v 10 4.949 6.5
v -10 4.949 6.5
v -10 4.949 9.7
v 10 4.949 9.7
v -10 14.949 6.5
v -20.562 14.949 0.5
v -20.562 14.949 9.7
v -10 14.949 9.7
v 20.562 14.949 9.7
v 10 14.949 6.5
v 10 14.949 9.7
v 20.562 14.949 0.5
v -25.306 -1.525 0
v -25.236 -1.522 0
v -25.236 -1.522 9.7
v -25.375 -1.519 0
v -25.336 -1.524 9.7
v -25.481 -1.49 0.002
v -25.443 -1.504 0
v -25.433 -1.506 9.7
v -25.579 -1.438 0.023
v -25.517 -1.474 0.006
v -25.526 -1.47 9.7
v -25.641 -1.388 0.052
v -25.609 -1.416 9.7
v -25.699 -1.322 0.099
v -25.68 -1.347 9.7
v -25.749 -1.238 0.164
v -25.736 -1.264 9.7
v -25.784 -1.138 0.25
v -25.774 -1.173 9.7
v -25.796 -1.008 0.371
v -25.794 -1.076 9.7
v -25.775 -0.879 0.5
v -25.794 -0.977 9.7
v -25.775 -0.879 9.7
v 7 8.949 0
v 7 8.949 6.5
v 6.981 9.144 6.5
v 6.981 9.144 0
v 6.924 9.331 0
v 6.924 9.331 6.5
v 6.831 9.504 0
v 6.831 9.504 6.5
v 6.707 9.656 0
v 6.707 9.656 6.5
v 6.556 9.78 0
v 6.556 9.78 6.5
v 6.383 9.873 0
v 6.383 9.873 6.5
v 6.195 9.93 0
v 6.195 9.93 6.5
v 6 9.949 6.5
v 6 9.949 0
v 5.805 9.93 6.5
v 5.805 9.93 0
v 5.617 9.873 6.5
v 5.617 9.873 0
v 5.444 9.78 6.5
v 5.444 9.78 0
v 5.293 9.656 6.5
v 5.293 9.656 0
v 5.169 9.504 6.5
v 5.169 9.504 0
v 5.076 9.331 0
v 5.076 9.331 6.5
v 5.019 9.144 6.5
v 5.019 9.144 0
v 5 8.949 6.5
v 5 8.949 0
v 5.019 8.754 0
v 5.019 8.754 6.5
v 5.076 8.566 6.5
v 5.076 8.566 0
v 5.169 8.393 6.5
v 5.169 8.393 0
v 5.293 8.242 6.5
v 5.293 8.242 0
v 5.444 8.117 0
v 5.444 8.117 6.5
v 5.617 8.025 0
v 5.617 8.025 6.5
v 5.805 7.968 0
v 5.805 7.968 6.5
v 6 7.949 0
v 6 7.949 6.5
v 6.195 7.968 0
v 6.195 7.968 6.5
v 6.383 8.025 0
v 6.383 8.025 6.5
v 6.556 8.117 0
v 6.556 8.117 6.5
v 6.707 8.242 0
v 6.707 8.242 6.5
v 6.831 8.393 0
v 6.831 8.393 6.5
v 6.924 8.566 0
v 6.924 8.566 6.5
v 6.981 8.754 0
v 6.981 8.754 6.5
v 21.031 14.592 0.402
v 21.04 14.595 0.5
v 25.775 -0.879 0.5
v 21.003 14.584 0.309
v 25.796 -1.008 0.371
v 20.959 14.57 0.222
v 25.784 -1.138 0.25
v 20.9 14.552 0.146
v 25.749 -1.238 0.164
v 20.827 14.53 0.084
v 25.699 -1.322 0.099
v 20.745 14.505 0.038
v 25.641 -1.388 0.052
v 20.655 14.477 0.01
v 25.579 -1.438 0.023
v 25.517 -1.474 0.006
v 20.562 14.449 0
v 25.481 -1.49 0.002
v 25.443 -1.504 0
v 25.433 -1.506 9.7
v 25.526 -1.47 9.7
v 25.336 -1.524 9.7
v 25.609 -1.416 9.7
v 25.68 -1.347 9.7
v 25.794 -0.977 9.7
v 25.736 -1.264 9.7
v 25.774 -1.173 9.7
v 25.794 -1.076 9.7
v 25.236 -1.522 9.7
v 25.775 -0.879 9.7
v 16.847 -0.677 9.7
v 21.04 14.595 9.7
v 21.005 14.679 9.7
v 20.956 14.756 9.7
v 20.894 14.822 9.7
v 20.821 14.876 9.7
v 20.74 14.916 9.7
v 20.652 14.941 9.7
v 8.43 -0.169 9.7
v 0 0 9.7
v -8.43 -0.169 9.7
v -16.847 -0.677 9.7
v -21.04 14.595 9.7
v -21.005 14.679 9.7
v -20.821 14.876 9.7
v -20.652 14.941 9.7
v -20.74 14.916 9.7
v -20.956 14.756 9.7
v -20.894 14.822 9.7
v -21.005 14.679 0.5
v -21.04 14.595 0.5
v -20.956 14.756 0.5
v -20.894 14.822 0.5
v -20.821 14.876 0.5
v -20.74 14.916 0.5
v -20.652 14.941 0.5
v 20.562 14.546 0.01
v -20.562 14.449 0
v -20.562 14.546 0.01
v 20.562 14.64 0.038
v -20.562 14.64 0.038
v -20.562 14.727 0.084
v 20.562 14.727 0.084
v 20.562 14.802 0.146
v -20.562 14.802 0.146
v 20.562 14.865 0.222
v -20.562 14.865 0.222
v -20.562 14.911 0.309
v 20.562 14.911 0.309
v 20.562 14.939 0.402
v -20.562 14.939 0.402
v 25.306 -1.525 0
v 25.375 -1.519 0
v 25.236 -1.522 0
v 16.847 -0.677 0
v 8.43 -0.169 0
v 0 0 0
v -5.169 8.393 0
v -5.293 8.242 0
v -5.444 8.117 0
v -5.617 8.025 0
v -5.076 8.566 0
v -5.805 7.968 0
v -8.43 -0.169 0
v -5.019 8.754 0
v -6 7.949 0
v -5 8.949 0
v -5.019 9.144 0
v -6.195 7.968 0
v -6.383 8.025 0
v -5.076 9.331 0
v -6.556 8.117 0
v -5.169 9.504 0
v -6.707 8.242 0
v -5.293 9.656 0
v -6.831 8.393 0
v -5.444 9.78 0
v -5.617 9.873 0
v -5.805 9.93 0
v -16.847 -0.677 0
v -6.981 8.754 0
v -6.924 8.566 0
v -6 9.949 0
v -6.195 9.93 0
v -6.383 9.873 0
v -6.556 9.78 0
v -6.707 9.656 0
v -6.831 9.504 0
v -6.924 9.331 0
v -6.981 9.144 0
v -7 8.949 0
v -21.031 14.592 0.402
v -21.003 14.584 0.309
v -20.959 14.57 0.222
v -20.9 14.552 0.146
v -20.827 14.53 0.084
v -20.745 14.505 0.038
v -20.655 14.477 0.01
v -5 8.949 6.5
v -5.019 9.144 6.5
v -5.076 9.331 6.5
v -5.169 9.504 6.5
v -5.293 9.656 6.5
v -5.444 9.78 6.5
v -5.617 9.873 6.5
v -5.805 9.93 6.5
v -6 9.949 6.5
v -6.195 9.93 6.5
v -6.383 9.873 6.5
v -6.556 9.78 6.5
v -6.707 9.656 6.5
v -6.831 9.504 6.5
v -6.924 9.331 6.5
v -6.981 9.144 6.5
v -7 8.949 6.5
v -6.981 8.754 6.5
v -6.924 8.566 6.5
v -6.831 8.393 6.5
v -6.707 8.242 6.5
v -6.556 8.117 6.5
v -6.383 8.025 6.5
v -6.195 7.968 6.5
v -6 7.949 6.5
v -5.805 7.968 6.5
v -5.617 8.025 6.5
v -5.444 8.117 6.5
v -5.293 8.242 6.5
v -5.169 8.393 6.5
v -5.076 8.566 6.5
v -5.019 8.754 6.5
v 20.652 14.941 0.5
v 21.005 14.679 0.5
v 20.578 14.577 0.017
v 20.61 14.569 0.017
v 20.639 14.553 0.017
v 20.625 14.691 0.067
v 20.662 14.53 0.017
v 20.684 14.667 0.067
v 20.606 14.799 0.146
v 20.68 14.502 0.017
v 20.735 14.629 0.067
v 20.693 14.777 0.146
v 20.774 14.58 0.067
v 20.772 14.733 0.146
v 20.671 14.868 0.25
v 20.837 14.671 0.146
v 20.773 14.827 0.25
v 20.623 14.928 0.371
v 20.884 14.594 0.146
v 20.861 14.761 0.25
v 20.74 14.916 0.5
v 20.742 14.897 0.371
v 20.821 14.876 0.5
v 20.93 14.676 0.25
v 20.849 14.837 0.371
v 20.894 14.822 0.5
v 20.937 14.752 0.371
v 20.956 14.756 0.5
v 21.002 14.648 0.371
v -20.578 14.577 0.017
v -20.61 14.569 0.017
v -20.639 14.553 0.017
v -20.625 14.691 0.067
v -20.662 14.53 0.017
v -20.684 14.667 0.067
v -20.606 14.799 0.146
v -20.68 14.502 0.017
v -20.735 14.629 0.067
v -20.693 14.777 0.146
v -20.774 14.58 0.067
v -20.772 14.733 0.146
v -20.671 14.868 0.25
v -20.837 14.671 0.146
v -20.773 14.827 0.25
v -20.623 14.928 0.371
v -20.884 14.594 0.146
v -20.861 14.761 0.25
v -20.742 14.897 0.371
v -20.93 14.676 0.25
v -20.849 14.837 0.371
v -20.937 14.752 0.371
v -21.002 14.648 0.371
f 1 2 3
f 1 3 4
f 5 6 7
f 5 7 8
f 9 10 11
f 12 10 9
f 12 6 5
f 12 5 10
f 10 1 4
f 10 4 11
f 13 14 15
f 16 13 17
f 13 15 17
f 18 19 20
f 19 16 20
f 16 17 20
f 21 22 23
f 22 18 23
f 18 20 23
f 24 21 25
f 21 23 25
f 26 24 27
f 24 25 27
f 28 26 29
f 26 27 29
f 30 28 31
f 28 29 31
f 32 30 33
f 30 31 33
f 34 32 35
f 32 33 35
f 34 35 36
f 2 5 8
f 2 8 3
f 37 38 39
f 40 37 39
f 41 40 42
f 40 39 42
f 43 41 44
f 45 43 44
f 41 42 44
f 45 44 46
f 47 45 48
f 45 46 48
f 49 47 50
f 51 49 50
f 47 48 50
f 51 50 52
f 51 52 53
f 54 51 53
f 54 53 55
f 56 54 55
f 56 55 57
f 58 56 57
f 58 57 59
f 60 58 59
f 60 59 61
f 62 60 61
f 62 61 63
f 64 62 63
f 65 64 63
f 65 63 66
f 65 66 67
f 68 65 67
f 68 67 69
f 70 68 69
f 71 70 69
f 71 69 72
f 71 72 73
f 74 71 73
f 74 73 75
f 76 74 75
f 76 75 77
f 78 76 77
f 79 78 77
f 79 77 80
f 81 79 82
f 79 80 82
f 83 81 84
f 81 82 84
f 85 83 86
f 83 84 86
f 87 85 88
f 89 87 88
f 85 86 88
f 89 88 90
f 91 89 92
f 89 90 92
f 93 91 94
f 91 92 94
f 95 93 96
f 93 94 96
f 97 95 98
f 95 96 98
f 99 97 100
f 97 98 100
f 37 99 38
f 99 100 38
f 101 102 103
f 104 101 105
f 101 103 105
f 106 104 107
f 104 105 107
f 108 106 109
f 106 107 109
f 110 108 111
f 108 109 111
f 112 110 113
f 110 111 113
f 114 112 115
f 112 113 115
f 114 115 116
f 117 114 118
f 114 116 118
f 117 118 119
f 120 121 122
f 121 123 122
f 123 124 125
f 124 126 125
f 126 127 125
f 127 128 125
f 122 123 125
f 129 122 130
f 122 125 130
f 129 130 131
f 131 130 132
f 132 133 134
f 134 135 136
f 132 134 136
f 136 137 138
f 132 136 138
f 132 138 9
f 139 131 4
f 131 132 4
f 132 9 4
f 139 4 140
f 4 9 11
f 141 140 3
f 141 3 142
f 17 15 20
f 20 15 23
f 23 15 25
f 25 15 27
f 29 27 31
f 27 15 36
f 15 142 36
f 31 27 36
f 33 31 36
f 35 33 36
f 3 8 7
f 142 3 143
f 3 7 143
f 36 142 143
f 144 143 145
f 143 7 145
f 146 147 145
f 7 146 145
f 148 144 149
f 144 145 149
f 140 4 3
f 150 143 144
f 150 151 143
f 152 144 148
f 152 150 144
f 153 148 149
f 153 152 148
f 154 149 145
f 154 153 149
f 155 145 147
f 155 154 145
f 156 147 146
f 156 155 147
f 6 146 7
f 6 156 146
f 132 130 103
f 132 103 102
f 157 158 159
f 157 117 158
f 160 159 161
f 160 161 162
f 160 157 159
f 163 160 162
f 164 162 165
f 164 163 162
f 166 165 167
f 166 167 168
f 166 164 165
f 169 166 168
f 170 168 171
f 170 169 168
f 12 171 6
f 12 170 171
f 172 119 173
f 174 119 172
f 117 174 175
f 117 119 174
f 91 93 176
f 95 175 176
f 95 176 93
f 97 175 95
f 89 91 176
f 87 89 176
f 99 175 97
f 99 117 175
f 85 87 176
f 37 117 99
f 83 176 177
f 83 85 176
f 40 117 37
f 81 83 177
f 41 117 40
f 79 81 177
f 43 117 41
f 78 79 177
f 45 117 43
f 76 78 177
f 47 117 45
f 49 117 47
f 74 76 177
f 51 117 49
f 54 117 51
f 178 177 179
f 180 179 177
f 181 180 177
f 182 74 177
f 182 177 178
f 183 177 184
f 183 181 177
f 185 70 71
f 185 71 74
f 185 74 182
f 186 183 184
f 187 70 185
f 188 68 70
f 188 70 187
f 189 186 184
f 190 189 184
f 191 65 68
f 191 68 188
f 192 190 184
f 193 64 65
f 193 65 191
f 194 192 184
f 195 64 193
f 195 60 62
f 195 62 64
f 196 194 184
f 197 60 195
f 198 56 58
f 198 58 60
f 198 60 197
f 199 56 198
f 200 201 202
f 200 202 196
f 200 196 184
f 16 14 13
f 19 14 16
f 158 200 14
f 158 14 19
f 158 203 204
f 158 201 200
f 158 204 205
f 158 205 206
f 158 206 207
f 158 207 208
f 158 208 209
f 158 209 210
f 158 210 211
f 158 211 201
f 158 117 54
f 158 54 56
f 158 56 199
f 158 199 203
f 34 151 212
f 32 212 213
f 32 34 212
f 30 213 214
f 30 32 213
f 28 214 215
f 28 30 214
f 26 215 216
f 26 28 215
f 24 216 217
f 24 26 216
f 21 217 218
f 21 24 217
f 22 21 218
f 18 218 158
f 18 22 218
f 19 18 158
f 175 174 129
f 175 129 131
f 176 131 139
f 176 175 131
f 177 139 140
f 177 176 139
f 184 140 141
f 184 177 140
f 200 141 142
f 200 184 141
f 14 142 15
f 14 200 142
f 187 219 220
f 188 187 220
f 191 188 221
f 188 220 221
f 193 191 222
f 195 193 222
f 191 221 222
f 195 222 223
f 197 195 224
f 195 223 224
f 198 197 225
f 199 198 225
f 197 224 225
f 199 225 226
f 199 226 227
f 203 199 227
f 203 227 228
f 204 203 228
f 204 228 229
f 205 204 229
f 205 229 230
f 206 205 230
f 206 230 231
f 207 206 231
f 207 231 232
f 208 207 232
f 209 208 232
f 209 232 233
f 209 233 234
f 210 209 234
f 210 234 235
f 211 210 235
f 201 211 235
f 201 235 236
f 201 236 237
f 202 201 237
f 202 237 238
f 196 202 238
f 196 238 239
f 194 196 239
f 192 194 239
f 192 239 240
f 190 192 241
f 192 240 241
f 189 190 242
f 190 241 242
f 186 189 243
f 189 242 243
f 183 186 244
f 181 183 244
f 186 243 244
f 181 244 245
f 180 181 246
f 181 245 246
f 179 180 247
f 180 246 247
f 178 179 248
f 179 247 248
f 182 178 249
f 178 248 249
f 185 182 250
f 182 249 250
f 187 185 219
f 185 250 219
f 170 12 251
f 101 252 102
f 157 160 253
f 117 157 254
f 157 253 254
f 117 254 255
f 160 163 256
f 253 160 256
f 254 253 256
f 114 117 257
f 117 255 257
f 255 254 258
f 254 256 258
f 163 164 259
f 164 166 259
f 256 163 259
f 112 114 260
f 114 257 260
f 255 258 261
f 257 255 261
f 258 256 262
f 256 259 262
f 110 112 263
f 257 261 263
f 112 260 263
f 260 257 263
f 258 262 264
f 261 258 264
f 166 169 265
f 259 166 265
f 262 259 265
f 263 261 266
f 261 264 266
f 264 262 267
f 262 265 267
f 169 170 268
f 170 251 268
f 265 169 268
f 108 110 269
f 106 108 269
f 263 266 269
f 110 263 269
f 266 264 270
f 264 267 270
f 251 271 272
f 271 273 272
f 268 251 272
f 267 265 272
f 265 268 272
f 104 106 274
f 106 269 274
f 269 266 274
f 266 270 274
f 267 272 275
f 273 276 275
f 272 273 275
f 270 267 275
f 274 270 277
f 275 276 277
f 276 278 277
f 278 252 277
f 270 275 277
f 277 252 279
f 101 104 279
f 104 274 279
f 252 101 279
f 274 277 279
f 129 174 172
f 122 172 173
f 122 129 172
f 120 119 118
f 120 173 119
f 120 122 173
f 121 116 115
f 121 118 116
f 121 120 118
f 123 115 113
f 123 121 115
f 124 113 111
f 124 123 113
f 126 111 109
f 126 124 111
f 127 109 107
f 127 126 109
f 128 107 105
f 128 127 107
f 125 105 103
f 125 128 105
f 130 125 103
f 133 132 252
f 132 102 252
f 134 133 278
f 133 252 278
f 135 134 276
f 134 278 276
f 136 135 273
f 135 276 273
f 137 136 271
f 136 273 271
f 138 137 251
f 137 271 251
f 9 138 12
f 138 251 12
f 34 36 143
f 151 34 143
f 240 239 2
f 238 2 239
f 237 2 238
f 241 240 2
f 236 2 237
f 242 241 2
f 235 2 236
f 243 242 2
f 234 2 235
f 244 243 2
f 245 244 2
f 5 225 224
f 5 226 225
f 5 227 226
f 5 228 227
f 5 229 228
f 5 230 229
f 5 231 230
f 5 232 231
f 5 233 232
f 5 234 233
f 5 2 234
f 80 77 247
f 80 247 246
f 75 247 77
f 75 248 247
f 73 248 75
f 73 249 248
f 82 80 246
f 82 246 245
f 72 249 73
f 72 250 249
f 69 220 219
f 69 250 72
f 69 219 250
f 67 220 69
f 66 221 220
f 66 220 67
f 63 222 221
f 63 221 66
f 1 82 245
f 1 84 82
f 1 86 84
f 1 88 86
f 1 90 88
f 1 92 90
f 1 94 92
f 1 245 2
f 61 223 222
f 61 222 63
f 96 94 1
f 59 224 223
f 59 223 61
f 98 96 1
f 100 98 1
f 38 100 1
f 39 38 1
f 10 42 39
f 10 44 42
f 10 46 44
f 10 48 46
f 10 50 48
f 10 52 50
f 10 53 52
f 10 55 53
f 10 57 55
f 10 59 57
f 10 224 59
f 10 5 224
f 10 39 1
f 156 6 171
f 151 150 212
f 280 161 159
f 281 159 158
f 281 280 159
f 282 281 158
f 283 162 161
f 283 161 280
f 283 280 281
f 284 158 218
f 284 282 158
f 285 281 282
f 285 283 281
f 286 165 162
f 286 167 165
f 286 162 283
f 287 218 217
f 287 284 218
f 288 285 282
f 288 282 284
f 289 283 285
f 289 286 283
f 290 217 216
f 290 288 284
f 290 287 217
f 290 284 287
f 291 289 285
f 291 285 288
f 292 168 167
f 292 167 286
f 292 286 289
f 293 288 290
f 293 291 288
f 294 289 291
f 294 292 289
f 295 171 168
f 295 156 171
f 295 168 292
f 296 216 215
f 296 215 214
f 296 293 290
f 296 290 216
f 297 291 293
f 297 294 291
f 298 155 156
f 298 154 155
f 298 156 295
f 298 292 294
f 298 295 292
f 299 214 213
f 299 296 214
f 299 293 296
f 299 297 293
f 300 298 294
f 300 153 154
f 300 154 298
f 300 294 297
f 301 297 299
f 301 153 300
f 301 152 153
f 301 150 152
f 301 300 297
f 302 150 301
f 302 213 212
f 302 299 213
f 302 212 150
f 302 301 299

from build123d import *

# Parameters (mm, degrees)
EXTRUDE_1_DEPTH          = 9.7
CUT_EXTRUDE_2_DEPTH      = 32.520737269
FILLET_3_R               = 0.5
CUT_EXTRUDE_5_DEPTH      = 32.353102755
CUT_EXTRUDE_5_DEPTH_BACK = 3.2
SKETCH_18_R              = 1
CUT_EXTRUDE_6_DEPTH      = 31.515193795


with BuildPart() as part:
    # 草图1 → 凸台-拉伸1 (new body)
    with BuildSketch(Plane.XY):
        with BuildLine():
            Line((-21, 14.94880858), (21, 14.94880858))
            Line((21, 14.94880858), (23.5, 14.94880858))
            Line((23.5, 14.94880858), (26, -1.615739558))
            ThreePointArc((26, -1.615739558), (0, 0), (-26, -1.615739558))
            Line((-26, -1.615739558), (-23.5, 14.94880858))
            Line((-23.5, 14.94880858), (-21, 14.94880858))
        make_face()
    extrude(amount=EXTRUDE_1_DEPTH)

    # 草图10 → 切除-拉伸2 (cut, through all)
    with BuildSketch(Plane.XY.offset(9.7)):
        Polygon((26, -1.615739558), (20.914837438, 15.00313582), (23.5, 14.94880858), align=None)
    cut_extrude_2 = extrude(amount=-CUT_EXTRUDE_2_DEPTH, mode=Mode.SUBTRACT)

    # 镜向1: 切除-拉伸2 across plane
    add(cut_extrude_2.mirror(Plane(origin=(0, 0, 0), x_dir=(0, 0, 1), z_dir=(1, 0, 0))), mode=Mode.SUBTRACT)

    # 圆角3
    fillet_3_edges = [part.edges().sort_by_distance(p)[0] for p in [
        (26, -1.615739558, 4.85),
        (-26, -1.615739558, 4.85),
        (0, 14.94880858, 0),
        (23.465730438, 6.666534511, 0),
        (20.931460876, 14.94880858, 4.85),
        (-23.465730438, 6.666534511, 0),
        (-20.931460876, 14.94880858, 4.85),
    ]]
    fillet(fillet_3_edges, radius=FILLET_3_R)

    # 草图17 → 切除-拉伸5 (cut, two sides: drawn at the far end of the back side and taken through both)
    with BuildSketch(Plane.XY.offset(9.7).offset(-CUT_EXTRUDE_5_DEPTH_BACK)):
        Polygon((-10, 103.759816228), (-10, 14.94880858), (-10, 4.94880858), (10, 4.94880858), (10, 14.94880858), (10, 103.759816228), (10, 281.381831522), (-10, 281.381831522), align=None)
    extrude(amount=CUT_EXTRUDE_5_DEPTH + CUT_EXTRUDE_5_DEPTH_BACK, mode=Mode.SUBTRACT)

    # 草图18 → 切除-拉伸6 (cut, through all)
    with BuildSketch(Plane.XY.offset(6.5)):
        with Locations((-6, 8.94880858)):
            Circle(SKETCH_18_R)
        with Locations((6, 8.94880858)):
            Circle(SKETCH_18_R)
    extrude(amount=-CUT_EXTRUDE_6_DEPTH, mode=Mode.SUBTRACT)


solid = part.part
